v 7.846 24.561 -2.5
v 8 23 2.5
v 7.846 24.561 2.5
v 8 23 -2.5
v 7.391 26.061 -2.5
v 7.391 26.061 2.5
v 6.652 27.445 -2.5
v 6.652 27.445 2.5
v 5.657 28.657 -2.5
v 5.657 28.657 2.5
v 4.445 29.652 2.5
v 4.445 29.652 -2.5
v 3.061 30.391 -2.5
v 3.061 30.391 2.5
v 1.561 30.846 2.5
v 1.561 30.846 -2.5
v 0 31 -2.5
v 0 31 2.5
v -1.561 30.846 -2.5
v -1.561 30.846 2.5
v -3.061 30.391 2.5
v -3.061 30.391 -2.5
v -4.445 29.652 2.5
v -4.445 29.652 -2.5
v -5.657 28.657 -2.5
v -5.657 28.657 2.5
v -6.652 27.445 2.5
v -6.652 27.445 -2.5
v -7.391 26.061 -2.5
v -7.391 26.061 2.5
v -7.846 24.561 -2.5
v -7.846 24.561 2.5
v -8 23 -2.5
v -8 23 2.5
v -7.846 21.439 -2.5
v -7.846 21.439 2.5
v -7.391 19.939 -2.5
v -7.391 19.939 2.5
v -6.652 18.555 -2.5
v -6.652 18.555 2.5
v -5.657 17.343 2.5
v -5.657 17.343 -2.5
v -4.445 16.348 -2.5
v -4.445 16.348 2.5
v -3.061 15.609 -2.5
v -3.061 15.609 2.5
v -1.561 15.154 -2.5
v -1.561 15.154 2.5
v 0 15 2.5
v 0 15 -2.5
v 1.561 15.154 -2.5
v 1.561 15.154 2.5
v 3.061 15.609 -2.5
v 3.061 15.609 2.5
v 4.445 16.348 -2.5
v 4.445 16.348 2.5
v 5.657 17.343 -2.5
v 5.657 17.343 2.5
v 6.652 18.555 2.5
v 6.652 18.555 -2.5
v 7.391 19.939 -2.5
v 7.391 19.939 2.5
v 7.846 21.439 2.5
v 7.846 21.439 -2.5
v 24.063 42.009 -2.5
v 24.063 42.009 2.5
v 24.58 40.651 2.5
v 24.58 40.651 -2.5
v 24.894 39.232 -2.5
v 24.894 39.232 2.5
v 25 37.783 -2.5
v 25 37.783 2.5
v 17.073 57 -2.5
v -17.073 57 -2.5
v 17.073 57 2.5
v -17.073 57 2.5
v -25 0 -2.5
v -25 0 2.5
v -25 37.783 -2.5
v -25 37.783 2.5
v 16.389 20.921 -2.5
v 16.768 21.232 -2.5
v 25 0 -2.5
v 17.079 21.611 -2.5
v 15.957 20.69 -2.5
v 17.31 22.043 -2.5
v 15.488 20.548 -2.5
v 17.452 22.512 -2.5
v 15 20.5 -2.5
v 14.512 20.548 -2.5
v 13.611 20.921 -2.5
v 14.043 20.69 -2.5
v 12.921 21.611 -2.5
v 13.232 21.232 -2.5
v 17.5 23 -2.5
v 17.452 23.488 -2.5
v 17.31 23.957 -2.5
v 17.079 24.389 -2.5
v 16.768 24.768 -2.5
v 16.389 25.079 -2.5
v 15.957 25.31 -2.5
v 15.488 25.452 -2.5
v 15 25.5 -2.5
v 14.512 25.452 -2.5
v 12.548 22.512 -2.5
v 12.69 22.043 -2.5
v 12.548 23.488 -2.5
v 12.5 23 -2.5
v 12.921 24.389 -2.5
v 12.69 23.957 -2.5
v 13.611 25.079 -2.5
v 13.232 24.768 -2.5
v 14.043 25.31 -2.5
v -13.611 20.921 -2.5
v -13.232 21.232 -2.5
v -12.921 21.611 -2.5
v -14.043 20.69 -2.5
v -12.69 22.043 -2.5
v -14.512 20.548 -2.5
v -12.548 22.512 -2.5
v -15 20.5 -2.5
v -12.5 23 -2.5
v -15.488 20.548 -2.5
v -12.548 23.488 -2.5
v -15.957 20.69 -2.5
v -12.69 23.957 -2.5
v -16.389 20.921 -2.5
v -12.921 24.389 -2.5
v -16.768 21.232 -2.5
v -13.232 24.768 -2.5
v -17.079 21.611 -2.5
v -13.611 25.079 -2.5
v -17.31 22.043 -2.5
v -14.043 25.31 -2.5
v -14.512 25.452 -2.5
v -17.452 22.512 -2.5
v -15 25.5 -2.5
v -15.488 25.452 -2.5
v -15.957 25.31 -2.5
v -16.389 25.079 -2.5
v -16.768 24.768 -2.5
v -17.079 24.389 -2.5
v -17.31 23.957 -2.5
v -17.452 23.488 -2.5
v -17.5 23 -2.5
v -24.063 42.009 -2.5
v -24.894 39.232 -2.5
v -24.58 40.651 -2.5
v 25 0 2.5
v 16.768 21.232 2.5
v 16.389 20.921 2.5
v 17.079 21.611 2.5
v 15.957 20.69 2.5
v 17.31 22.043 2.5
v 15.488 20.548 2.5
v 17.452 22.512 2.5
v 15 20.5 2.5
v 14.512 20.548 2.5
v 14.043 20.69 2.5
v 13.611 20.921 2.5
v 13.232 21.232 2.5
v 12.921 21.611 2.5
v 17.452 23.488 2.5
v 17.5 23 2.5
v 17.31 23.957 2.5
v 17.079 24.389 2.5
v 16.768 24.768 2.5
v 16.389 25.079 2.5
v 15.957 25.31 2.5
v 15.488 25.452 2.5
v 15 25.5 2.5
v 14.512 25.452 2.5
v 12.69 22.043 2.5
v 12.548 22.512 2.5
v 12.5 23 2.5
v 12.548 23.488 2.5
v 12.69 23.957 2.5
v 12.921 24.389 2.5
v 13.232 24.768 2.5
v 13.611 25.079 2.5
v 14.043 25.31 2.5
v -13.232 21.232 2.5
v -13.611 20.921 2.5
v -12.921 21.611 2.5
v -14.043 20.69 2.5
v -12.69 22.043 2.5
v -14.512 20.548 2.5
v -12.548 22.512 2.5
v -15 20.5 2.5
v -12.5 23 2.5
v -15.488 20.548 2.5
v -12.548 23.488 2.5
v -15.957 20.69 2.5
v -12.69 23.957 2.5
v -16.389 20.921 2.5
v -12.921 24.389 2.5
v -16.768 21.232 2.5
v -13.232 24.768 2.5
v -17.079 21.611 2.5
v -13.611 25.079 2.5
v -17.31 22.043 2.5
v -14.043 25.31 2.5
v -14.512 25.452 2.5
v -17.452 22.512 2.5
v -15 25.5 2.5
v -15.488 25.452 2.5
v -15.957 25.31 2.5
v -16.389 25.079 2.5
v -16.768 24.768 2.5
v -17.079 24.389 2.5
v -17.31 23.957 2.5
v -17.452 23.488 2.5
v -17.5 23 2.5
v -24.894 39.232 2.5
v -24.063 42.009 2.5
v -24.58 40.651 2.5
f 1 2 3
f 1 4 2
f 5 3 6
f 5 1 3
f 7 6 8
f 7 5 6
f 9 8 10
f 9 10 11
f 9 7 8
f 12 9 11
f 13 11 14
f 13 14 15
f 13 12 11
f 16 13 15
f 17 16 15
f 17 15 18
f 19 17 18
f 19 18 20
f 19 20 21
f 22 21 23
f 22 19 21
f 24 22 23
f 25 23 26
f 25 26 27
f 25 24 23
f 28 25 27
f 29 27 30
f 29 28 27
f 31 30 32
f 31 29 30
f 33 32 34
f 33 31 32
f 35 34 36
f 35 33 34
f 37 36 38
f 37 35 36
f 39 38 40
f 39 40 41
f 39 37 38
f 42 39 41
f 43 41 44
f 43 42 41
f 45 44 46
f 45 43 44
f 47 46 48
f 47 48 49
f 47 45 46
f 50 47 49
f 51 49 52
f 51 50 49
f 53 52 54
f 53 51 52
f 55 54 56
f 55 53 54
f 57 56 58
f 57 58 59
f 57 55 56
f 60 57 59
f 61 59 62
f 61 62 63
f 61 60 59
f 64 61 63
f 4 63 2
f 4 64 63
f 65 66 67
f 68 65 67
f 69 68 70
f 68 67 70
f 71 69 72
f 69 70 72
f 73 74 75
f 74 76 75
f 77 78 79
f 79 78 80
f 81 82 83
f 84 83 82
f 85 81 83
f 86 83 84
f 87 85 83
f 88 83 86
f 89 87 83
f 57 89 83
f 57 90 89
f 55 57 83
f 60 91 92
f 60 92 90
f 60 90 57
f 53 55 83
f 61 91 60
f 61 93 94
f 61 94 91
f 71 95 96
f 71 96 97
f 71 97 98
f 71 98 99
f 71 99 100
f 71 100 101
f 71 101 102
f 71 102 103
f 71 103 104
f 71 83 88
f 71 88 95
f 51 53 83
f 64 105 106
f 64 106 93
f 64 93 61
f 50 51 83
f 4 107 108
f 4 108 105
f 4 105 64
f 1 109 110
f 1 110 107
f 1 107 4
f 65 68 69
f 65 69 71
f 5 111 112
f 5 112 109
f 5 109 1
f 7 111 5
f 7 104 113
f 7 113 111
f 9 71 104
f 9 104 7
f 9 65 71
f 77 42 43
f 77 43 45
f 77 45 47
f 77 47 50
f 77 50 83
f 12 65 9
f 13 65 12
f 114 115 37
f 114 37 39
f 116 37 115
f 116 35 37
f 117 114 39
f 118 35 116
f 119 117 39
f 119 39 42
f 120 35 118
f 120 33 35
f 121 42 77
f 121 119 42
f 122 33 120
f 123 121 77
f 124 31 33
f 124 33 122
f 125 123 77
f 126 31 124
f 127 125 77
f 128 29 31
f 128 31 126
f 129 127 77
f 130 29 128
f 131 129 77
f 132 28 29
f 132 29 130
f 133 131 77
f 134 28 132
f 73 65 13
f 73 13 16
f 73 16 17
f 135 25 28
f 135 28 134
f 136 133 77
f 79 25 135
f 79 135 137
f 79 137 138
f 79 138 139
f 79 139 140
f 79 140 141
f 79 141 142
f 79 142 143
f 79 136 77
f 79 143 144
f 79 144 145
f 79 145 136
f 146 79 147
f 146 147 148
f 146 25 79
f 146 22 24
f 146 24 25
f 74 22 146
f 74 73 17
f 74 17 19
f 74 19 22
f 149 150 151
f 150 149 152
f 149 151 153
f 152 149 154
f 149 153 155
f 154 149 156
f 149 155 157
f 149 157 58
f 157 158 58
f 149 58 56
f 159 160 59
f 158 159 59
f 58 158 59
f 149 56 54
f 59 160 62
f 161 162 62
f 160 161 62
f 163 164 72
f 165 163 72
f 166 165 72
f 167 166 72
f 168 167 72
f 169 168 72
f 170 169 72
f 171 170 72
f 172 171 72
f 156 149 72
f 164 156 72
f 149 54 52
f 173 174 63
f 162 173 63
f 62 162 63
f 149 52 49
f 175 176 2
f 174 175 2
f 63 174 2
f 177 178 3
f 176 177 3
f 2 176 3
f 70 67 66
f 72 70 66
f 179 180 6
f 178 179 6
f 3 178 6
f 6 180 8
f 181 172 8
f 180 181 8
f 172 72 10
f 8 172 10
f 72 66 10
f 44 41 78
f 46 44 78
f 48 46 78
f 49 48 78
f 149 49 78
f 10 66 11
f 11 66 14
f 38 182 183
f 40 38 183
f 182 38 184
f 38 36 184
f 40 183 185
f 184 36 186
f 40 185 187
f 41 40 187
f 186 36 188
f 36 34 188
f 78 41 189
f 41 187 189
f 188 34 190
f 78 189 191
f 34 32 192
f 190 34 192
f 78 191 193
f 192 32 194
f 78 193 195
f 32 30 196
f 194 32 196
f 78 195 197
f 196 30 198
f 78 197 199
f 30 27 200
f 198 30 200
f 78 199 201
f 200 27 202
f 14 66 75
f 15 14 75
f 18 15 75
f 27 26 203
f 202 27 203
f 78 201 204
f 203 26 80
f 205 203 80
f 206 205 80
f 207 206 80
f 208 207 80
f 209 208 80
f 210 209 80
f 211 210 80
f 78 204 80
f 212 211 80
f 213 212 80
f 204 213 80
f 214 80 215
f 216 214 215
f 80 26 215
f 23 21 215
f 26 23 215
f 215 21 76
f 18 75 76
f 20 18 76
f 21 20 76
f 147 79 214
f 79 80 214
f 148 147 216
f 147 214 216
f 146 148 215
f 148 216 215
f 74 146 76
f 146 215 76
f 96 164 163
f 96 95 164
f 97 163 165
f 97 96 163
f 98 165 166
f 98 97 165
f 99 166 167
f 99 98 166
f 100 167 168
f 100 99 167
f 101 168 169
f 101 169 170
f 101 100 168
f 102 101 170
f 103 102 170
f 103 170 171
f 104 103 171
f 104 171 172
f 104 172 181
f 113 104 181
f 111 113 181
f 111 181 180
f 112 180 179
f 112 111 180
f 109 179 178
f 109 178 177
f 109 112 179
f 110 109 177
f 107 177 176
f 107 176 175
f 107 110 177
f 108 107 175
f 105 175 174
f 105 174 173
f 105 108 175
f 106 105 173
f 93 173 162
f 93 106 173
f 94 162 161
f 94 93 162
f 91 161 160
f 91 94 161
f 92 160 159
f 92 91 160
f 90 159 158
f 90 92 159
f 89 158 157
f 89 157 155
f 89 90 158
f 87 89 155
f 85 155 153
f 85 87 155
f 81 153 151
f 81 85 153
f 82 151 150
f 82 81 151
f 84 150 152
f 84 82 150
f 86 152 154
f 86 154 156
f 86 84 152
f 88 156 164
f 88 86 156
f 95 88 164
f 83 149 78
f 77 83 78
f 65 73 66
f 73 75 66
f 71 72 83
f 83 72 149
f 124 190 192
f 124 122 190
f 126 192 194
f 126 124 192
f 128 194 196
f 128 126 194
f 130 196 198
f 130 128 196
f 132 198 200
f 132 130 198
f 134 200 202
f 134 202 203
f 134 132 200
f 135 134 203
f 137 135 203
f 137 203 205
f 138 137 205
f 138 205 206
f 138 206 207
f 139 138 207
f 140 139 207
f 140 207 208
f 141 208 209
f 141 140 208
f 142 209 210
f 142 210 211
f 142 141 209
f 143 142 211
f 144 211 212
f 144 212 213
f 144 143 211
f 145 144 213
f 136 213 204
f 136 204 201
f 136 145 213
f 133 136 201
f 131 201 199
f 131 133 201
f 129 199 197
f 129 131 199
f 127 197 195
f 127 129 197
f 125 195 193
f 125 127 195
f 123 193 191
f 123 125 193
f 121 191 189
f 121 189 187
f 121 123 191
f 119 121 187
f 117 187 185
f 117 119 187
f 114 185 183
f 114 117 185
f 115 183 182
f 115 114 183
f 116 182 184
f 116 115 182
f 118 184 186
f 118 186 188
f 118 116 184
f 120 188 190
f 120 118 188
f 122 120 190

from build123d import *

# Parameters (mm, degrees)
SKETCH1_R           = 8
SKETCH1_R_2         = 2.5
BOSS_EXTRUDE1_DEPTH = 2.5


with BuildPart() as part:
    # Sketch1 → Boss-Extrude1 (new, symmetric)
    with BuildSketch(Plane.XY):
        with BuildLine():
            Line((-25, 0), (-25, 37.783053374))
            ThreePointArc((-25, 37.783053374), (-24.762960071, 39.947449513), (-24.06307787, 42.009235991))
            Line((-24.06307787, 42.009235991), (-17.072769811, 57))
            Line((-17.072769811, 57), (17.072769811, 57))
            Line((17.072769811, 57), (24.06307787, 42.009235991))
            ThreePointArc((24.06307787, 42.009235991), (24.762960071, 39.947449513), (25, 37.783053374))
            Line((25, 37.783053374), (25, 0))
            Line((25, 0), (-25, 0))
        make_face()
        with Locations((0, 23)):
            Circle(SKETCH1_R, mode=Mode.SUBTRACT)
        with Locations((-15, 23)):
            Circle(SKETCH1_R_2, mode=Mode.SUBTRACT)
        with Locations((15, 23)):
            Circle(SKETCH1_R_2, mode=Mode.SUBTRACT)
    extrude(amount=BOSS_EXTRUDE1_DEPTH, both=True)


solid = part.part
